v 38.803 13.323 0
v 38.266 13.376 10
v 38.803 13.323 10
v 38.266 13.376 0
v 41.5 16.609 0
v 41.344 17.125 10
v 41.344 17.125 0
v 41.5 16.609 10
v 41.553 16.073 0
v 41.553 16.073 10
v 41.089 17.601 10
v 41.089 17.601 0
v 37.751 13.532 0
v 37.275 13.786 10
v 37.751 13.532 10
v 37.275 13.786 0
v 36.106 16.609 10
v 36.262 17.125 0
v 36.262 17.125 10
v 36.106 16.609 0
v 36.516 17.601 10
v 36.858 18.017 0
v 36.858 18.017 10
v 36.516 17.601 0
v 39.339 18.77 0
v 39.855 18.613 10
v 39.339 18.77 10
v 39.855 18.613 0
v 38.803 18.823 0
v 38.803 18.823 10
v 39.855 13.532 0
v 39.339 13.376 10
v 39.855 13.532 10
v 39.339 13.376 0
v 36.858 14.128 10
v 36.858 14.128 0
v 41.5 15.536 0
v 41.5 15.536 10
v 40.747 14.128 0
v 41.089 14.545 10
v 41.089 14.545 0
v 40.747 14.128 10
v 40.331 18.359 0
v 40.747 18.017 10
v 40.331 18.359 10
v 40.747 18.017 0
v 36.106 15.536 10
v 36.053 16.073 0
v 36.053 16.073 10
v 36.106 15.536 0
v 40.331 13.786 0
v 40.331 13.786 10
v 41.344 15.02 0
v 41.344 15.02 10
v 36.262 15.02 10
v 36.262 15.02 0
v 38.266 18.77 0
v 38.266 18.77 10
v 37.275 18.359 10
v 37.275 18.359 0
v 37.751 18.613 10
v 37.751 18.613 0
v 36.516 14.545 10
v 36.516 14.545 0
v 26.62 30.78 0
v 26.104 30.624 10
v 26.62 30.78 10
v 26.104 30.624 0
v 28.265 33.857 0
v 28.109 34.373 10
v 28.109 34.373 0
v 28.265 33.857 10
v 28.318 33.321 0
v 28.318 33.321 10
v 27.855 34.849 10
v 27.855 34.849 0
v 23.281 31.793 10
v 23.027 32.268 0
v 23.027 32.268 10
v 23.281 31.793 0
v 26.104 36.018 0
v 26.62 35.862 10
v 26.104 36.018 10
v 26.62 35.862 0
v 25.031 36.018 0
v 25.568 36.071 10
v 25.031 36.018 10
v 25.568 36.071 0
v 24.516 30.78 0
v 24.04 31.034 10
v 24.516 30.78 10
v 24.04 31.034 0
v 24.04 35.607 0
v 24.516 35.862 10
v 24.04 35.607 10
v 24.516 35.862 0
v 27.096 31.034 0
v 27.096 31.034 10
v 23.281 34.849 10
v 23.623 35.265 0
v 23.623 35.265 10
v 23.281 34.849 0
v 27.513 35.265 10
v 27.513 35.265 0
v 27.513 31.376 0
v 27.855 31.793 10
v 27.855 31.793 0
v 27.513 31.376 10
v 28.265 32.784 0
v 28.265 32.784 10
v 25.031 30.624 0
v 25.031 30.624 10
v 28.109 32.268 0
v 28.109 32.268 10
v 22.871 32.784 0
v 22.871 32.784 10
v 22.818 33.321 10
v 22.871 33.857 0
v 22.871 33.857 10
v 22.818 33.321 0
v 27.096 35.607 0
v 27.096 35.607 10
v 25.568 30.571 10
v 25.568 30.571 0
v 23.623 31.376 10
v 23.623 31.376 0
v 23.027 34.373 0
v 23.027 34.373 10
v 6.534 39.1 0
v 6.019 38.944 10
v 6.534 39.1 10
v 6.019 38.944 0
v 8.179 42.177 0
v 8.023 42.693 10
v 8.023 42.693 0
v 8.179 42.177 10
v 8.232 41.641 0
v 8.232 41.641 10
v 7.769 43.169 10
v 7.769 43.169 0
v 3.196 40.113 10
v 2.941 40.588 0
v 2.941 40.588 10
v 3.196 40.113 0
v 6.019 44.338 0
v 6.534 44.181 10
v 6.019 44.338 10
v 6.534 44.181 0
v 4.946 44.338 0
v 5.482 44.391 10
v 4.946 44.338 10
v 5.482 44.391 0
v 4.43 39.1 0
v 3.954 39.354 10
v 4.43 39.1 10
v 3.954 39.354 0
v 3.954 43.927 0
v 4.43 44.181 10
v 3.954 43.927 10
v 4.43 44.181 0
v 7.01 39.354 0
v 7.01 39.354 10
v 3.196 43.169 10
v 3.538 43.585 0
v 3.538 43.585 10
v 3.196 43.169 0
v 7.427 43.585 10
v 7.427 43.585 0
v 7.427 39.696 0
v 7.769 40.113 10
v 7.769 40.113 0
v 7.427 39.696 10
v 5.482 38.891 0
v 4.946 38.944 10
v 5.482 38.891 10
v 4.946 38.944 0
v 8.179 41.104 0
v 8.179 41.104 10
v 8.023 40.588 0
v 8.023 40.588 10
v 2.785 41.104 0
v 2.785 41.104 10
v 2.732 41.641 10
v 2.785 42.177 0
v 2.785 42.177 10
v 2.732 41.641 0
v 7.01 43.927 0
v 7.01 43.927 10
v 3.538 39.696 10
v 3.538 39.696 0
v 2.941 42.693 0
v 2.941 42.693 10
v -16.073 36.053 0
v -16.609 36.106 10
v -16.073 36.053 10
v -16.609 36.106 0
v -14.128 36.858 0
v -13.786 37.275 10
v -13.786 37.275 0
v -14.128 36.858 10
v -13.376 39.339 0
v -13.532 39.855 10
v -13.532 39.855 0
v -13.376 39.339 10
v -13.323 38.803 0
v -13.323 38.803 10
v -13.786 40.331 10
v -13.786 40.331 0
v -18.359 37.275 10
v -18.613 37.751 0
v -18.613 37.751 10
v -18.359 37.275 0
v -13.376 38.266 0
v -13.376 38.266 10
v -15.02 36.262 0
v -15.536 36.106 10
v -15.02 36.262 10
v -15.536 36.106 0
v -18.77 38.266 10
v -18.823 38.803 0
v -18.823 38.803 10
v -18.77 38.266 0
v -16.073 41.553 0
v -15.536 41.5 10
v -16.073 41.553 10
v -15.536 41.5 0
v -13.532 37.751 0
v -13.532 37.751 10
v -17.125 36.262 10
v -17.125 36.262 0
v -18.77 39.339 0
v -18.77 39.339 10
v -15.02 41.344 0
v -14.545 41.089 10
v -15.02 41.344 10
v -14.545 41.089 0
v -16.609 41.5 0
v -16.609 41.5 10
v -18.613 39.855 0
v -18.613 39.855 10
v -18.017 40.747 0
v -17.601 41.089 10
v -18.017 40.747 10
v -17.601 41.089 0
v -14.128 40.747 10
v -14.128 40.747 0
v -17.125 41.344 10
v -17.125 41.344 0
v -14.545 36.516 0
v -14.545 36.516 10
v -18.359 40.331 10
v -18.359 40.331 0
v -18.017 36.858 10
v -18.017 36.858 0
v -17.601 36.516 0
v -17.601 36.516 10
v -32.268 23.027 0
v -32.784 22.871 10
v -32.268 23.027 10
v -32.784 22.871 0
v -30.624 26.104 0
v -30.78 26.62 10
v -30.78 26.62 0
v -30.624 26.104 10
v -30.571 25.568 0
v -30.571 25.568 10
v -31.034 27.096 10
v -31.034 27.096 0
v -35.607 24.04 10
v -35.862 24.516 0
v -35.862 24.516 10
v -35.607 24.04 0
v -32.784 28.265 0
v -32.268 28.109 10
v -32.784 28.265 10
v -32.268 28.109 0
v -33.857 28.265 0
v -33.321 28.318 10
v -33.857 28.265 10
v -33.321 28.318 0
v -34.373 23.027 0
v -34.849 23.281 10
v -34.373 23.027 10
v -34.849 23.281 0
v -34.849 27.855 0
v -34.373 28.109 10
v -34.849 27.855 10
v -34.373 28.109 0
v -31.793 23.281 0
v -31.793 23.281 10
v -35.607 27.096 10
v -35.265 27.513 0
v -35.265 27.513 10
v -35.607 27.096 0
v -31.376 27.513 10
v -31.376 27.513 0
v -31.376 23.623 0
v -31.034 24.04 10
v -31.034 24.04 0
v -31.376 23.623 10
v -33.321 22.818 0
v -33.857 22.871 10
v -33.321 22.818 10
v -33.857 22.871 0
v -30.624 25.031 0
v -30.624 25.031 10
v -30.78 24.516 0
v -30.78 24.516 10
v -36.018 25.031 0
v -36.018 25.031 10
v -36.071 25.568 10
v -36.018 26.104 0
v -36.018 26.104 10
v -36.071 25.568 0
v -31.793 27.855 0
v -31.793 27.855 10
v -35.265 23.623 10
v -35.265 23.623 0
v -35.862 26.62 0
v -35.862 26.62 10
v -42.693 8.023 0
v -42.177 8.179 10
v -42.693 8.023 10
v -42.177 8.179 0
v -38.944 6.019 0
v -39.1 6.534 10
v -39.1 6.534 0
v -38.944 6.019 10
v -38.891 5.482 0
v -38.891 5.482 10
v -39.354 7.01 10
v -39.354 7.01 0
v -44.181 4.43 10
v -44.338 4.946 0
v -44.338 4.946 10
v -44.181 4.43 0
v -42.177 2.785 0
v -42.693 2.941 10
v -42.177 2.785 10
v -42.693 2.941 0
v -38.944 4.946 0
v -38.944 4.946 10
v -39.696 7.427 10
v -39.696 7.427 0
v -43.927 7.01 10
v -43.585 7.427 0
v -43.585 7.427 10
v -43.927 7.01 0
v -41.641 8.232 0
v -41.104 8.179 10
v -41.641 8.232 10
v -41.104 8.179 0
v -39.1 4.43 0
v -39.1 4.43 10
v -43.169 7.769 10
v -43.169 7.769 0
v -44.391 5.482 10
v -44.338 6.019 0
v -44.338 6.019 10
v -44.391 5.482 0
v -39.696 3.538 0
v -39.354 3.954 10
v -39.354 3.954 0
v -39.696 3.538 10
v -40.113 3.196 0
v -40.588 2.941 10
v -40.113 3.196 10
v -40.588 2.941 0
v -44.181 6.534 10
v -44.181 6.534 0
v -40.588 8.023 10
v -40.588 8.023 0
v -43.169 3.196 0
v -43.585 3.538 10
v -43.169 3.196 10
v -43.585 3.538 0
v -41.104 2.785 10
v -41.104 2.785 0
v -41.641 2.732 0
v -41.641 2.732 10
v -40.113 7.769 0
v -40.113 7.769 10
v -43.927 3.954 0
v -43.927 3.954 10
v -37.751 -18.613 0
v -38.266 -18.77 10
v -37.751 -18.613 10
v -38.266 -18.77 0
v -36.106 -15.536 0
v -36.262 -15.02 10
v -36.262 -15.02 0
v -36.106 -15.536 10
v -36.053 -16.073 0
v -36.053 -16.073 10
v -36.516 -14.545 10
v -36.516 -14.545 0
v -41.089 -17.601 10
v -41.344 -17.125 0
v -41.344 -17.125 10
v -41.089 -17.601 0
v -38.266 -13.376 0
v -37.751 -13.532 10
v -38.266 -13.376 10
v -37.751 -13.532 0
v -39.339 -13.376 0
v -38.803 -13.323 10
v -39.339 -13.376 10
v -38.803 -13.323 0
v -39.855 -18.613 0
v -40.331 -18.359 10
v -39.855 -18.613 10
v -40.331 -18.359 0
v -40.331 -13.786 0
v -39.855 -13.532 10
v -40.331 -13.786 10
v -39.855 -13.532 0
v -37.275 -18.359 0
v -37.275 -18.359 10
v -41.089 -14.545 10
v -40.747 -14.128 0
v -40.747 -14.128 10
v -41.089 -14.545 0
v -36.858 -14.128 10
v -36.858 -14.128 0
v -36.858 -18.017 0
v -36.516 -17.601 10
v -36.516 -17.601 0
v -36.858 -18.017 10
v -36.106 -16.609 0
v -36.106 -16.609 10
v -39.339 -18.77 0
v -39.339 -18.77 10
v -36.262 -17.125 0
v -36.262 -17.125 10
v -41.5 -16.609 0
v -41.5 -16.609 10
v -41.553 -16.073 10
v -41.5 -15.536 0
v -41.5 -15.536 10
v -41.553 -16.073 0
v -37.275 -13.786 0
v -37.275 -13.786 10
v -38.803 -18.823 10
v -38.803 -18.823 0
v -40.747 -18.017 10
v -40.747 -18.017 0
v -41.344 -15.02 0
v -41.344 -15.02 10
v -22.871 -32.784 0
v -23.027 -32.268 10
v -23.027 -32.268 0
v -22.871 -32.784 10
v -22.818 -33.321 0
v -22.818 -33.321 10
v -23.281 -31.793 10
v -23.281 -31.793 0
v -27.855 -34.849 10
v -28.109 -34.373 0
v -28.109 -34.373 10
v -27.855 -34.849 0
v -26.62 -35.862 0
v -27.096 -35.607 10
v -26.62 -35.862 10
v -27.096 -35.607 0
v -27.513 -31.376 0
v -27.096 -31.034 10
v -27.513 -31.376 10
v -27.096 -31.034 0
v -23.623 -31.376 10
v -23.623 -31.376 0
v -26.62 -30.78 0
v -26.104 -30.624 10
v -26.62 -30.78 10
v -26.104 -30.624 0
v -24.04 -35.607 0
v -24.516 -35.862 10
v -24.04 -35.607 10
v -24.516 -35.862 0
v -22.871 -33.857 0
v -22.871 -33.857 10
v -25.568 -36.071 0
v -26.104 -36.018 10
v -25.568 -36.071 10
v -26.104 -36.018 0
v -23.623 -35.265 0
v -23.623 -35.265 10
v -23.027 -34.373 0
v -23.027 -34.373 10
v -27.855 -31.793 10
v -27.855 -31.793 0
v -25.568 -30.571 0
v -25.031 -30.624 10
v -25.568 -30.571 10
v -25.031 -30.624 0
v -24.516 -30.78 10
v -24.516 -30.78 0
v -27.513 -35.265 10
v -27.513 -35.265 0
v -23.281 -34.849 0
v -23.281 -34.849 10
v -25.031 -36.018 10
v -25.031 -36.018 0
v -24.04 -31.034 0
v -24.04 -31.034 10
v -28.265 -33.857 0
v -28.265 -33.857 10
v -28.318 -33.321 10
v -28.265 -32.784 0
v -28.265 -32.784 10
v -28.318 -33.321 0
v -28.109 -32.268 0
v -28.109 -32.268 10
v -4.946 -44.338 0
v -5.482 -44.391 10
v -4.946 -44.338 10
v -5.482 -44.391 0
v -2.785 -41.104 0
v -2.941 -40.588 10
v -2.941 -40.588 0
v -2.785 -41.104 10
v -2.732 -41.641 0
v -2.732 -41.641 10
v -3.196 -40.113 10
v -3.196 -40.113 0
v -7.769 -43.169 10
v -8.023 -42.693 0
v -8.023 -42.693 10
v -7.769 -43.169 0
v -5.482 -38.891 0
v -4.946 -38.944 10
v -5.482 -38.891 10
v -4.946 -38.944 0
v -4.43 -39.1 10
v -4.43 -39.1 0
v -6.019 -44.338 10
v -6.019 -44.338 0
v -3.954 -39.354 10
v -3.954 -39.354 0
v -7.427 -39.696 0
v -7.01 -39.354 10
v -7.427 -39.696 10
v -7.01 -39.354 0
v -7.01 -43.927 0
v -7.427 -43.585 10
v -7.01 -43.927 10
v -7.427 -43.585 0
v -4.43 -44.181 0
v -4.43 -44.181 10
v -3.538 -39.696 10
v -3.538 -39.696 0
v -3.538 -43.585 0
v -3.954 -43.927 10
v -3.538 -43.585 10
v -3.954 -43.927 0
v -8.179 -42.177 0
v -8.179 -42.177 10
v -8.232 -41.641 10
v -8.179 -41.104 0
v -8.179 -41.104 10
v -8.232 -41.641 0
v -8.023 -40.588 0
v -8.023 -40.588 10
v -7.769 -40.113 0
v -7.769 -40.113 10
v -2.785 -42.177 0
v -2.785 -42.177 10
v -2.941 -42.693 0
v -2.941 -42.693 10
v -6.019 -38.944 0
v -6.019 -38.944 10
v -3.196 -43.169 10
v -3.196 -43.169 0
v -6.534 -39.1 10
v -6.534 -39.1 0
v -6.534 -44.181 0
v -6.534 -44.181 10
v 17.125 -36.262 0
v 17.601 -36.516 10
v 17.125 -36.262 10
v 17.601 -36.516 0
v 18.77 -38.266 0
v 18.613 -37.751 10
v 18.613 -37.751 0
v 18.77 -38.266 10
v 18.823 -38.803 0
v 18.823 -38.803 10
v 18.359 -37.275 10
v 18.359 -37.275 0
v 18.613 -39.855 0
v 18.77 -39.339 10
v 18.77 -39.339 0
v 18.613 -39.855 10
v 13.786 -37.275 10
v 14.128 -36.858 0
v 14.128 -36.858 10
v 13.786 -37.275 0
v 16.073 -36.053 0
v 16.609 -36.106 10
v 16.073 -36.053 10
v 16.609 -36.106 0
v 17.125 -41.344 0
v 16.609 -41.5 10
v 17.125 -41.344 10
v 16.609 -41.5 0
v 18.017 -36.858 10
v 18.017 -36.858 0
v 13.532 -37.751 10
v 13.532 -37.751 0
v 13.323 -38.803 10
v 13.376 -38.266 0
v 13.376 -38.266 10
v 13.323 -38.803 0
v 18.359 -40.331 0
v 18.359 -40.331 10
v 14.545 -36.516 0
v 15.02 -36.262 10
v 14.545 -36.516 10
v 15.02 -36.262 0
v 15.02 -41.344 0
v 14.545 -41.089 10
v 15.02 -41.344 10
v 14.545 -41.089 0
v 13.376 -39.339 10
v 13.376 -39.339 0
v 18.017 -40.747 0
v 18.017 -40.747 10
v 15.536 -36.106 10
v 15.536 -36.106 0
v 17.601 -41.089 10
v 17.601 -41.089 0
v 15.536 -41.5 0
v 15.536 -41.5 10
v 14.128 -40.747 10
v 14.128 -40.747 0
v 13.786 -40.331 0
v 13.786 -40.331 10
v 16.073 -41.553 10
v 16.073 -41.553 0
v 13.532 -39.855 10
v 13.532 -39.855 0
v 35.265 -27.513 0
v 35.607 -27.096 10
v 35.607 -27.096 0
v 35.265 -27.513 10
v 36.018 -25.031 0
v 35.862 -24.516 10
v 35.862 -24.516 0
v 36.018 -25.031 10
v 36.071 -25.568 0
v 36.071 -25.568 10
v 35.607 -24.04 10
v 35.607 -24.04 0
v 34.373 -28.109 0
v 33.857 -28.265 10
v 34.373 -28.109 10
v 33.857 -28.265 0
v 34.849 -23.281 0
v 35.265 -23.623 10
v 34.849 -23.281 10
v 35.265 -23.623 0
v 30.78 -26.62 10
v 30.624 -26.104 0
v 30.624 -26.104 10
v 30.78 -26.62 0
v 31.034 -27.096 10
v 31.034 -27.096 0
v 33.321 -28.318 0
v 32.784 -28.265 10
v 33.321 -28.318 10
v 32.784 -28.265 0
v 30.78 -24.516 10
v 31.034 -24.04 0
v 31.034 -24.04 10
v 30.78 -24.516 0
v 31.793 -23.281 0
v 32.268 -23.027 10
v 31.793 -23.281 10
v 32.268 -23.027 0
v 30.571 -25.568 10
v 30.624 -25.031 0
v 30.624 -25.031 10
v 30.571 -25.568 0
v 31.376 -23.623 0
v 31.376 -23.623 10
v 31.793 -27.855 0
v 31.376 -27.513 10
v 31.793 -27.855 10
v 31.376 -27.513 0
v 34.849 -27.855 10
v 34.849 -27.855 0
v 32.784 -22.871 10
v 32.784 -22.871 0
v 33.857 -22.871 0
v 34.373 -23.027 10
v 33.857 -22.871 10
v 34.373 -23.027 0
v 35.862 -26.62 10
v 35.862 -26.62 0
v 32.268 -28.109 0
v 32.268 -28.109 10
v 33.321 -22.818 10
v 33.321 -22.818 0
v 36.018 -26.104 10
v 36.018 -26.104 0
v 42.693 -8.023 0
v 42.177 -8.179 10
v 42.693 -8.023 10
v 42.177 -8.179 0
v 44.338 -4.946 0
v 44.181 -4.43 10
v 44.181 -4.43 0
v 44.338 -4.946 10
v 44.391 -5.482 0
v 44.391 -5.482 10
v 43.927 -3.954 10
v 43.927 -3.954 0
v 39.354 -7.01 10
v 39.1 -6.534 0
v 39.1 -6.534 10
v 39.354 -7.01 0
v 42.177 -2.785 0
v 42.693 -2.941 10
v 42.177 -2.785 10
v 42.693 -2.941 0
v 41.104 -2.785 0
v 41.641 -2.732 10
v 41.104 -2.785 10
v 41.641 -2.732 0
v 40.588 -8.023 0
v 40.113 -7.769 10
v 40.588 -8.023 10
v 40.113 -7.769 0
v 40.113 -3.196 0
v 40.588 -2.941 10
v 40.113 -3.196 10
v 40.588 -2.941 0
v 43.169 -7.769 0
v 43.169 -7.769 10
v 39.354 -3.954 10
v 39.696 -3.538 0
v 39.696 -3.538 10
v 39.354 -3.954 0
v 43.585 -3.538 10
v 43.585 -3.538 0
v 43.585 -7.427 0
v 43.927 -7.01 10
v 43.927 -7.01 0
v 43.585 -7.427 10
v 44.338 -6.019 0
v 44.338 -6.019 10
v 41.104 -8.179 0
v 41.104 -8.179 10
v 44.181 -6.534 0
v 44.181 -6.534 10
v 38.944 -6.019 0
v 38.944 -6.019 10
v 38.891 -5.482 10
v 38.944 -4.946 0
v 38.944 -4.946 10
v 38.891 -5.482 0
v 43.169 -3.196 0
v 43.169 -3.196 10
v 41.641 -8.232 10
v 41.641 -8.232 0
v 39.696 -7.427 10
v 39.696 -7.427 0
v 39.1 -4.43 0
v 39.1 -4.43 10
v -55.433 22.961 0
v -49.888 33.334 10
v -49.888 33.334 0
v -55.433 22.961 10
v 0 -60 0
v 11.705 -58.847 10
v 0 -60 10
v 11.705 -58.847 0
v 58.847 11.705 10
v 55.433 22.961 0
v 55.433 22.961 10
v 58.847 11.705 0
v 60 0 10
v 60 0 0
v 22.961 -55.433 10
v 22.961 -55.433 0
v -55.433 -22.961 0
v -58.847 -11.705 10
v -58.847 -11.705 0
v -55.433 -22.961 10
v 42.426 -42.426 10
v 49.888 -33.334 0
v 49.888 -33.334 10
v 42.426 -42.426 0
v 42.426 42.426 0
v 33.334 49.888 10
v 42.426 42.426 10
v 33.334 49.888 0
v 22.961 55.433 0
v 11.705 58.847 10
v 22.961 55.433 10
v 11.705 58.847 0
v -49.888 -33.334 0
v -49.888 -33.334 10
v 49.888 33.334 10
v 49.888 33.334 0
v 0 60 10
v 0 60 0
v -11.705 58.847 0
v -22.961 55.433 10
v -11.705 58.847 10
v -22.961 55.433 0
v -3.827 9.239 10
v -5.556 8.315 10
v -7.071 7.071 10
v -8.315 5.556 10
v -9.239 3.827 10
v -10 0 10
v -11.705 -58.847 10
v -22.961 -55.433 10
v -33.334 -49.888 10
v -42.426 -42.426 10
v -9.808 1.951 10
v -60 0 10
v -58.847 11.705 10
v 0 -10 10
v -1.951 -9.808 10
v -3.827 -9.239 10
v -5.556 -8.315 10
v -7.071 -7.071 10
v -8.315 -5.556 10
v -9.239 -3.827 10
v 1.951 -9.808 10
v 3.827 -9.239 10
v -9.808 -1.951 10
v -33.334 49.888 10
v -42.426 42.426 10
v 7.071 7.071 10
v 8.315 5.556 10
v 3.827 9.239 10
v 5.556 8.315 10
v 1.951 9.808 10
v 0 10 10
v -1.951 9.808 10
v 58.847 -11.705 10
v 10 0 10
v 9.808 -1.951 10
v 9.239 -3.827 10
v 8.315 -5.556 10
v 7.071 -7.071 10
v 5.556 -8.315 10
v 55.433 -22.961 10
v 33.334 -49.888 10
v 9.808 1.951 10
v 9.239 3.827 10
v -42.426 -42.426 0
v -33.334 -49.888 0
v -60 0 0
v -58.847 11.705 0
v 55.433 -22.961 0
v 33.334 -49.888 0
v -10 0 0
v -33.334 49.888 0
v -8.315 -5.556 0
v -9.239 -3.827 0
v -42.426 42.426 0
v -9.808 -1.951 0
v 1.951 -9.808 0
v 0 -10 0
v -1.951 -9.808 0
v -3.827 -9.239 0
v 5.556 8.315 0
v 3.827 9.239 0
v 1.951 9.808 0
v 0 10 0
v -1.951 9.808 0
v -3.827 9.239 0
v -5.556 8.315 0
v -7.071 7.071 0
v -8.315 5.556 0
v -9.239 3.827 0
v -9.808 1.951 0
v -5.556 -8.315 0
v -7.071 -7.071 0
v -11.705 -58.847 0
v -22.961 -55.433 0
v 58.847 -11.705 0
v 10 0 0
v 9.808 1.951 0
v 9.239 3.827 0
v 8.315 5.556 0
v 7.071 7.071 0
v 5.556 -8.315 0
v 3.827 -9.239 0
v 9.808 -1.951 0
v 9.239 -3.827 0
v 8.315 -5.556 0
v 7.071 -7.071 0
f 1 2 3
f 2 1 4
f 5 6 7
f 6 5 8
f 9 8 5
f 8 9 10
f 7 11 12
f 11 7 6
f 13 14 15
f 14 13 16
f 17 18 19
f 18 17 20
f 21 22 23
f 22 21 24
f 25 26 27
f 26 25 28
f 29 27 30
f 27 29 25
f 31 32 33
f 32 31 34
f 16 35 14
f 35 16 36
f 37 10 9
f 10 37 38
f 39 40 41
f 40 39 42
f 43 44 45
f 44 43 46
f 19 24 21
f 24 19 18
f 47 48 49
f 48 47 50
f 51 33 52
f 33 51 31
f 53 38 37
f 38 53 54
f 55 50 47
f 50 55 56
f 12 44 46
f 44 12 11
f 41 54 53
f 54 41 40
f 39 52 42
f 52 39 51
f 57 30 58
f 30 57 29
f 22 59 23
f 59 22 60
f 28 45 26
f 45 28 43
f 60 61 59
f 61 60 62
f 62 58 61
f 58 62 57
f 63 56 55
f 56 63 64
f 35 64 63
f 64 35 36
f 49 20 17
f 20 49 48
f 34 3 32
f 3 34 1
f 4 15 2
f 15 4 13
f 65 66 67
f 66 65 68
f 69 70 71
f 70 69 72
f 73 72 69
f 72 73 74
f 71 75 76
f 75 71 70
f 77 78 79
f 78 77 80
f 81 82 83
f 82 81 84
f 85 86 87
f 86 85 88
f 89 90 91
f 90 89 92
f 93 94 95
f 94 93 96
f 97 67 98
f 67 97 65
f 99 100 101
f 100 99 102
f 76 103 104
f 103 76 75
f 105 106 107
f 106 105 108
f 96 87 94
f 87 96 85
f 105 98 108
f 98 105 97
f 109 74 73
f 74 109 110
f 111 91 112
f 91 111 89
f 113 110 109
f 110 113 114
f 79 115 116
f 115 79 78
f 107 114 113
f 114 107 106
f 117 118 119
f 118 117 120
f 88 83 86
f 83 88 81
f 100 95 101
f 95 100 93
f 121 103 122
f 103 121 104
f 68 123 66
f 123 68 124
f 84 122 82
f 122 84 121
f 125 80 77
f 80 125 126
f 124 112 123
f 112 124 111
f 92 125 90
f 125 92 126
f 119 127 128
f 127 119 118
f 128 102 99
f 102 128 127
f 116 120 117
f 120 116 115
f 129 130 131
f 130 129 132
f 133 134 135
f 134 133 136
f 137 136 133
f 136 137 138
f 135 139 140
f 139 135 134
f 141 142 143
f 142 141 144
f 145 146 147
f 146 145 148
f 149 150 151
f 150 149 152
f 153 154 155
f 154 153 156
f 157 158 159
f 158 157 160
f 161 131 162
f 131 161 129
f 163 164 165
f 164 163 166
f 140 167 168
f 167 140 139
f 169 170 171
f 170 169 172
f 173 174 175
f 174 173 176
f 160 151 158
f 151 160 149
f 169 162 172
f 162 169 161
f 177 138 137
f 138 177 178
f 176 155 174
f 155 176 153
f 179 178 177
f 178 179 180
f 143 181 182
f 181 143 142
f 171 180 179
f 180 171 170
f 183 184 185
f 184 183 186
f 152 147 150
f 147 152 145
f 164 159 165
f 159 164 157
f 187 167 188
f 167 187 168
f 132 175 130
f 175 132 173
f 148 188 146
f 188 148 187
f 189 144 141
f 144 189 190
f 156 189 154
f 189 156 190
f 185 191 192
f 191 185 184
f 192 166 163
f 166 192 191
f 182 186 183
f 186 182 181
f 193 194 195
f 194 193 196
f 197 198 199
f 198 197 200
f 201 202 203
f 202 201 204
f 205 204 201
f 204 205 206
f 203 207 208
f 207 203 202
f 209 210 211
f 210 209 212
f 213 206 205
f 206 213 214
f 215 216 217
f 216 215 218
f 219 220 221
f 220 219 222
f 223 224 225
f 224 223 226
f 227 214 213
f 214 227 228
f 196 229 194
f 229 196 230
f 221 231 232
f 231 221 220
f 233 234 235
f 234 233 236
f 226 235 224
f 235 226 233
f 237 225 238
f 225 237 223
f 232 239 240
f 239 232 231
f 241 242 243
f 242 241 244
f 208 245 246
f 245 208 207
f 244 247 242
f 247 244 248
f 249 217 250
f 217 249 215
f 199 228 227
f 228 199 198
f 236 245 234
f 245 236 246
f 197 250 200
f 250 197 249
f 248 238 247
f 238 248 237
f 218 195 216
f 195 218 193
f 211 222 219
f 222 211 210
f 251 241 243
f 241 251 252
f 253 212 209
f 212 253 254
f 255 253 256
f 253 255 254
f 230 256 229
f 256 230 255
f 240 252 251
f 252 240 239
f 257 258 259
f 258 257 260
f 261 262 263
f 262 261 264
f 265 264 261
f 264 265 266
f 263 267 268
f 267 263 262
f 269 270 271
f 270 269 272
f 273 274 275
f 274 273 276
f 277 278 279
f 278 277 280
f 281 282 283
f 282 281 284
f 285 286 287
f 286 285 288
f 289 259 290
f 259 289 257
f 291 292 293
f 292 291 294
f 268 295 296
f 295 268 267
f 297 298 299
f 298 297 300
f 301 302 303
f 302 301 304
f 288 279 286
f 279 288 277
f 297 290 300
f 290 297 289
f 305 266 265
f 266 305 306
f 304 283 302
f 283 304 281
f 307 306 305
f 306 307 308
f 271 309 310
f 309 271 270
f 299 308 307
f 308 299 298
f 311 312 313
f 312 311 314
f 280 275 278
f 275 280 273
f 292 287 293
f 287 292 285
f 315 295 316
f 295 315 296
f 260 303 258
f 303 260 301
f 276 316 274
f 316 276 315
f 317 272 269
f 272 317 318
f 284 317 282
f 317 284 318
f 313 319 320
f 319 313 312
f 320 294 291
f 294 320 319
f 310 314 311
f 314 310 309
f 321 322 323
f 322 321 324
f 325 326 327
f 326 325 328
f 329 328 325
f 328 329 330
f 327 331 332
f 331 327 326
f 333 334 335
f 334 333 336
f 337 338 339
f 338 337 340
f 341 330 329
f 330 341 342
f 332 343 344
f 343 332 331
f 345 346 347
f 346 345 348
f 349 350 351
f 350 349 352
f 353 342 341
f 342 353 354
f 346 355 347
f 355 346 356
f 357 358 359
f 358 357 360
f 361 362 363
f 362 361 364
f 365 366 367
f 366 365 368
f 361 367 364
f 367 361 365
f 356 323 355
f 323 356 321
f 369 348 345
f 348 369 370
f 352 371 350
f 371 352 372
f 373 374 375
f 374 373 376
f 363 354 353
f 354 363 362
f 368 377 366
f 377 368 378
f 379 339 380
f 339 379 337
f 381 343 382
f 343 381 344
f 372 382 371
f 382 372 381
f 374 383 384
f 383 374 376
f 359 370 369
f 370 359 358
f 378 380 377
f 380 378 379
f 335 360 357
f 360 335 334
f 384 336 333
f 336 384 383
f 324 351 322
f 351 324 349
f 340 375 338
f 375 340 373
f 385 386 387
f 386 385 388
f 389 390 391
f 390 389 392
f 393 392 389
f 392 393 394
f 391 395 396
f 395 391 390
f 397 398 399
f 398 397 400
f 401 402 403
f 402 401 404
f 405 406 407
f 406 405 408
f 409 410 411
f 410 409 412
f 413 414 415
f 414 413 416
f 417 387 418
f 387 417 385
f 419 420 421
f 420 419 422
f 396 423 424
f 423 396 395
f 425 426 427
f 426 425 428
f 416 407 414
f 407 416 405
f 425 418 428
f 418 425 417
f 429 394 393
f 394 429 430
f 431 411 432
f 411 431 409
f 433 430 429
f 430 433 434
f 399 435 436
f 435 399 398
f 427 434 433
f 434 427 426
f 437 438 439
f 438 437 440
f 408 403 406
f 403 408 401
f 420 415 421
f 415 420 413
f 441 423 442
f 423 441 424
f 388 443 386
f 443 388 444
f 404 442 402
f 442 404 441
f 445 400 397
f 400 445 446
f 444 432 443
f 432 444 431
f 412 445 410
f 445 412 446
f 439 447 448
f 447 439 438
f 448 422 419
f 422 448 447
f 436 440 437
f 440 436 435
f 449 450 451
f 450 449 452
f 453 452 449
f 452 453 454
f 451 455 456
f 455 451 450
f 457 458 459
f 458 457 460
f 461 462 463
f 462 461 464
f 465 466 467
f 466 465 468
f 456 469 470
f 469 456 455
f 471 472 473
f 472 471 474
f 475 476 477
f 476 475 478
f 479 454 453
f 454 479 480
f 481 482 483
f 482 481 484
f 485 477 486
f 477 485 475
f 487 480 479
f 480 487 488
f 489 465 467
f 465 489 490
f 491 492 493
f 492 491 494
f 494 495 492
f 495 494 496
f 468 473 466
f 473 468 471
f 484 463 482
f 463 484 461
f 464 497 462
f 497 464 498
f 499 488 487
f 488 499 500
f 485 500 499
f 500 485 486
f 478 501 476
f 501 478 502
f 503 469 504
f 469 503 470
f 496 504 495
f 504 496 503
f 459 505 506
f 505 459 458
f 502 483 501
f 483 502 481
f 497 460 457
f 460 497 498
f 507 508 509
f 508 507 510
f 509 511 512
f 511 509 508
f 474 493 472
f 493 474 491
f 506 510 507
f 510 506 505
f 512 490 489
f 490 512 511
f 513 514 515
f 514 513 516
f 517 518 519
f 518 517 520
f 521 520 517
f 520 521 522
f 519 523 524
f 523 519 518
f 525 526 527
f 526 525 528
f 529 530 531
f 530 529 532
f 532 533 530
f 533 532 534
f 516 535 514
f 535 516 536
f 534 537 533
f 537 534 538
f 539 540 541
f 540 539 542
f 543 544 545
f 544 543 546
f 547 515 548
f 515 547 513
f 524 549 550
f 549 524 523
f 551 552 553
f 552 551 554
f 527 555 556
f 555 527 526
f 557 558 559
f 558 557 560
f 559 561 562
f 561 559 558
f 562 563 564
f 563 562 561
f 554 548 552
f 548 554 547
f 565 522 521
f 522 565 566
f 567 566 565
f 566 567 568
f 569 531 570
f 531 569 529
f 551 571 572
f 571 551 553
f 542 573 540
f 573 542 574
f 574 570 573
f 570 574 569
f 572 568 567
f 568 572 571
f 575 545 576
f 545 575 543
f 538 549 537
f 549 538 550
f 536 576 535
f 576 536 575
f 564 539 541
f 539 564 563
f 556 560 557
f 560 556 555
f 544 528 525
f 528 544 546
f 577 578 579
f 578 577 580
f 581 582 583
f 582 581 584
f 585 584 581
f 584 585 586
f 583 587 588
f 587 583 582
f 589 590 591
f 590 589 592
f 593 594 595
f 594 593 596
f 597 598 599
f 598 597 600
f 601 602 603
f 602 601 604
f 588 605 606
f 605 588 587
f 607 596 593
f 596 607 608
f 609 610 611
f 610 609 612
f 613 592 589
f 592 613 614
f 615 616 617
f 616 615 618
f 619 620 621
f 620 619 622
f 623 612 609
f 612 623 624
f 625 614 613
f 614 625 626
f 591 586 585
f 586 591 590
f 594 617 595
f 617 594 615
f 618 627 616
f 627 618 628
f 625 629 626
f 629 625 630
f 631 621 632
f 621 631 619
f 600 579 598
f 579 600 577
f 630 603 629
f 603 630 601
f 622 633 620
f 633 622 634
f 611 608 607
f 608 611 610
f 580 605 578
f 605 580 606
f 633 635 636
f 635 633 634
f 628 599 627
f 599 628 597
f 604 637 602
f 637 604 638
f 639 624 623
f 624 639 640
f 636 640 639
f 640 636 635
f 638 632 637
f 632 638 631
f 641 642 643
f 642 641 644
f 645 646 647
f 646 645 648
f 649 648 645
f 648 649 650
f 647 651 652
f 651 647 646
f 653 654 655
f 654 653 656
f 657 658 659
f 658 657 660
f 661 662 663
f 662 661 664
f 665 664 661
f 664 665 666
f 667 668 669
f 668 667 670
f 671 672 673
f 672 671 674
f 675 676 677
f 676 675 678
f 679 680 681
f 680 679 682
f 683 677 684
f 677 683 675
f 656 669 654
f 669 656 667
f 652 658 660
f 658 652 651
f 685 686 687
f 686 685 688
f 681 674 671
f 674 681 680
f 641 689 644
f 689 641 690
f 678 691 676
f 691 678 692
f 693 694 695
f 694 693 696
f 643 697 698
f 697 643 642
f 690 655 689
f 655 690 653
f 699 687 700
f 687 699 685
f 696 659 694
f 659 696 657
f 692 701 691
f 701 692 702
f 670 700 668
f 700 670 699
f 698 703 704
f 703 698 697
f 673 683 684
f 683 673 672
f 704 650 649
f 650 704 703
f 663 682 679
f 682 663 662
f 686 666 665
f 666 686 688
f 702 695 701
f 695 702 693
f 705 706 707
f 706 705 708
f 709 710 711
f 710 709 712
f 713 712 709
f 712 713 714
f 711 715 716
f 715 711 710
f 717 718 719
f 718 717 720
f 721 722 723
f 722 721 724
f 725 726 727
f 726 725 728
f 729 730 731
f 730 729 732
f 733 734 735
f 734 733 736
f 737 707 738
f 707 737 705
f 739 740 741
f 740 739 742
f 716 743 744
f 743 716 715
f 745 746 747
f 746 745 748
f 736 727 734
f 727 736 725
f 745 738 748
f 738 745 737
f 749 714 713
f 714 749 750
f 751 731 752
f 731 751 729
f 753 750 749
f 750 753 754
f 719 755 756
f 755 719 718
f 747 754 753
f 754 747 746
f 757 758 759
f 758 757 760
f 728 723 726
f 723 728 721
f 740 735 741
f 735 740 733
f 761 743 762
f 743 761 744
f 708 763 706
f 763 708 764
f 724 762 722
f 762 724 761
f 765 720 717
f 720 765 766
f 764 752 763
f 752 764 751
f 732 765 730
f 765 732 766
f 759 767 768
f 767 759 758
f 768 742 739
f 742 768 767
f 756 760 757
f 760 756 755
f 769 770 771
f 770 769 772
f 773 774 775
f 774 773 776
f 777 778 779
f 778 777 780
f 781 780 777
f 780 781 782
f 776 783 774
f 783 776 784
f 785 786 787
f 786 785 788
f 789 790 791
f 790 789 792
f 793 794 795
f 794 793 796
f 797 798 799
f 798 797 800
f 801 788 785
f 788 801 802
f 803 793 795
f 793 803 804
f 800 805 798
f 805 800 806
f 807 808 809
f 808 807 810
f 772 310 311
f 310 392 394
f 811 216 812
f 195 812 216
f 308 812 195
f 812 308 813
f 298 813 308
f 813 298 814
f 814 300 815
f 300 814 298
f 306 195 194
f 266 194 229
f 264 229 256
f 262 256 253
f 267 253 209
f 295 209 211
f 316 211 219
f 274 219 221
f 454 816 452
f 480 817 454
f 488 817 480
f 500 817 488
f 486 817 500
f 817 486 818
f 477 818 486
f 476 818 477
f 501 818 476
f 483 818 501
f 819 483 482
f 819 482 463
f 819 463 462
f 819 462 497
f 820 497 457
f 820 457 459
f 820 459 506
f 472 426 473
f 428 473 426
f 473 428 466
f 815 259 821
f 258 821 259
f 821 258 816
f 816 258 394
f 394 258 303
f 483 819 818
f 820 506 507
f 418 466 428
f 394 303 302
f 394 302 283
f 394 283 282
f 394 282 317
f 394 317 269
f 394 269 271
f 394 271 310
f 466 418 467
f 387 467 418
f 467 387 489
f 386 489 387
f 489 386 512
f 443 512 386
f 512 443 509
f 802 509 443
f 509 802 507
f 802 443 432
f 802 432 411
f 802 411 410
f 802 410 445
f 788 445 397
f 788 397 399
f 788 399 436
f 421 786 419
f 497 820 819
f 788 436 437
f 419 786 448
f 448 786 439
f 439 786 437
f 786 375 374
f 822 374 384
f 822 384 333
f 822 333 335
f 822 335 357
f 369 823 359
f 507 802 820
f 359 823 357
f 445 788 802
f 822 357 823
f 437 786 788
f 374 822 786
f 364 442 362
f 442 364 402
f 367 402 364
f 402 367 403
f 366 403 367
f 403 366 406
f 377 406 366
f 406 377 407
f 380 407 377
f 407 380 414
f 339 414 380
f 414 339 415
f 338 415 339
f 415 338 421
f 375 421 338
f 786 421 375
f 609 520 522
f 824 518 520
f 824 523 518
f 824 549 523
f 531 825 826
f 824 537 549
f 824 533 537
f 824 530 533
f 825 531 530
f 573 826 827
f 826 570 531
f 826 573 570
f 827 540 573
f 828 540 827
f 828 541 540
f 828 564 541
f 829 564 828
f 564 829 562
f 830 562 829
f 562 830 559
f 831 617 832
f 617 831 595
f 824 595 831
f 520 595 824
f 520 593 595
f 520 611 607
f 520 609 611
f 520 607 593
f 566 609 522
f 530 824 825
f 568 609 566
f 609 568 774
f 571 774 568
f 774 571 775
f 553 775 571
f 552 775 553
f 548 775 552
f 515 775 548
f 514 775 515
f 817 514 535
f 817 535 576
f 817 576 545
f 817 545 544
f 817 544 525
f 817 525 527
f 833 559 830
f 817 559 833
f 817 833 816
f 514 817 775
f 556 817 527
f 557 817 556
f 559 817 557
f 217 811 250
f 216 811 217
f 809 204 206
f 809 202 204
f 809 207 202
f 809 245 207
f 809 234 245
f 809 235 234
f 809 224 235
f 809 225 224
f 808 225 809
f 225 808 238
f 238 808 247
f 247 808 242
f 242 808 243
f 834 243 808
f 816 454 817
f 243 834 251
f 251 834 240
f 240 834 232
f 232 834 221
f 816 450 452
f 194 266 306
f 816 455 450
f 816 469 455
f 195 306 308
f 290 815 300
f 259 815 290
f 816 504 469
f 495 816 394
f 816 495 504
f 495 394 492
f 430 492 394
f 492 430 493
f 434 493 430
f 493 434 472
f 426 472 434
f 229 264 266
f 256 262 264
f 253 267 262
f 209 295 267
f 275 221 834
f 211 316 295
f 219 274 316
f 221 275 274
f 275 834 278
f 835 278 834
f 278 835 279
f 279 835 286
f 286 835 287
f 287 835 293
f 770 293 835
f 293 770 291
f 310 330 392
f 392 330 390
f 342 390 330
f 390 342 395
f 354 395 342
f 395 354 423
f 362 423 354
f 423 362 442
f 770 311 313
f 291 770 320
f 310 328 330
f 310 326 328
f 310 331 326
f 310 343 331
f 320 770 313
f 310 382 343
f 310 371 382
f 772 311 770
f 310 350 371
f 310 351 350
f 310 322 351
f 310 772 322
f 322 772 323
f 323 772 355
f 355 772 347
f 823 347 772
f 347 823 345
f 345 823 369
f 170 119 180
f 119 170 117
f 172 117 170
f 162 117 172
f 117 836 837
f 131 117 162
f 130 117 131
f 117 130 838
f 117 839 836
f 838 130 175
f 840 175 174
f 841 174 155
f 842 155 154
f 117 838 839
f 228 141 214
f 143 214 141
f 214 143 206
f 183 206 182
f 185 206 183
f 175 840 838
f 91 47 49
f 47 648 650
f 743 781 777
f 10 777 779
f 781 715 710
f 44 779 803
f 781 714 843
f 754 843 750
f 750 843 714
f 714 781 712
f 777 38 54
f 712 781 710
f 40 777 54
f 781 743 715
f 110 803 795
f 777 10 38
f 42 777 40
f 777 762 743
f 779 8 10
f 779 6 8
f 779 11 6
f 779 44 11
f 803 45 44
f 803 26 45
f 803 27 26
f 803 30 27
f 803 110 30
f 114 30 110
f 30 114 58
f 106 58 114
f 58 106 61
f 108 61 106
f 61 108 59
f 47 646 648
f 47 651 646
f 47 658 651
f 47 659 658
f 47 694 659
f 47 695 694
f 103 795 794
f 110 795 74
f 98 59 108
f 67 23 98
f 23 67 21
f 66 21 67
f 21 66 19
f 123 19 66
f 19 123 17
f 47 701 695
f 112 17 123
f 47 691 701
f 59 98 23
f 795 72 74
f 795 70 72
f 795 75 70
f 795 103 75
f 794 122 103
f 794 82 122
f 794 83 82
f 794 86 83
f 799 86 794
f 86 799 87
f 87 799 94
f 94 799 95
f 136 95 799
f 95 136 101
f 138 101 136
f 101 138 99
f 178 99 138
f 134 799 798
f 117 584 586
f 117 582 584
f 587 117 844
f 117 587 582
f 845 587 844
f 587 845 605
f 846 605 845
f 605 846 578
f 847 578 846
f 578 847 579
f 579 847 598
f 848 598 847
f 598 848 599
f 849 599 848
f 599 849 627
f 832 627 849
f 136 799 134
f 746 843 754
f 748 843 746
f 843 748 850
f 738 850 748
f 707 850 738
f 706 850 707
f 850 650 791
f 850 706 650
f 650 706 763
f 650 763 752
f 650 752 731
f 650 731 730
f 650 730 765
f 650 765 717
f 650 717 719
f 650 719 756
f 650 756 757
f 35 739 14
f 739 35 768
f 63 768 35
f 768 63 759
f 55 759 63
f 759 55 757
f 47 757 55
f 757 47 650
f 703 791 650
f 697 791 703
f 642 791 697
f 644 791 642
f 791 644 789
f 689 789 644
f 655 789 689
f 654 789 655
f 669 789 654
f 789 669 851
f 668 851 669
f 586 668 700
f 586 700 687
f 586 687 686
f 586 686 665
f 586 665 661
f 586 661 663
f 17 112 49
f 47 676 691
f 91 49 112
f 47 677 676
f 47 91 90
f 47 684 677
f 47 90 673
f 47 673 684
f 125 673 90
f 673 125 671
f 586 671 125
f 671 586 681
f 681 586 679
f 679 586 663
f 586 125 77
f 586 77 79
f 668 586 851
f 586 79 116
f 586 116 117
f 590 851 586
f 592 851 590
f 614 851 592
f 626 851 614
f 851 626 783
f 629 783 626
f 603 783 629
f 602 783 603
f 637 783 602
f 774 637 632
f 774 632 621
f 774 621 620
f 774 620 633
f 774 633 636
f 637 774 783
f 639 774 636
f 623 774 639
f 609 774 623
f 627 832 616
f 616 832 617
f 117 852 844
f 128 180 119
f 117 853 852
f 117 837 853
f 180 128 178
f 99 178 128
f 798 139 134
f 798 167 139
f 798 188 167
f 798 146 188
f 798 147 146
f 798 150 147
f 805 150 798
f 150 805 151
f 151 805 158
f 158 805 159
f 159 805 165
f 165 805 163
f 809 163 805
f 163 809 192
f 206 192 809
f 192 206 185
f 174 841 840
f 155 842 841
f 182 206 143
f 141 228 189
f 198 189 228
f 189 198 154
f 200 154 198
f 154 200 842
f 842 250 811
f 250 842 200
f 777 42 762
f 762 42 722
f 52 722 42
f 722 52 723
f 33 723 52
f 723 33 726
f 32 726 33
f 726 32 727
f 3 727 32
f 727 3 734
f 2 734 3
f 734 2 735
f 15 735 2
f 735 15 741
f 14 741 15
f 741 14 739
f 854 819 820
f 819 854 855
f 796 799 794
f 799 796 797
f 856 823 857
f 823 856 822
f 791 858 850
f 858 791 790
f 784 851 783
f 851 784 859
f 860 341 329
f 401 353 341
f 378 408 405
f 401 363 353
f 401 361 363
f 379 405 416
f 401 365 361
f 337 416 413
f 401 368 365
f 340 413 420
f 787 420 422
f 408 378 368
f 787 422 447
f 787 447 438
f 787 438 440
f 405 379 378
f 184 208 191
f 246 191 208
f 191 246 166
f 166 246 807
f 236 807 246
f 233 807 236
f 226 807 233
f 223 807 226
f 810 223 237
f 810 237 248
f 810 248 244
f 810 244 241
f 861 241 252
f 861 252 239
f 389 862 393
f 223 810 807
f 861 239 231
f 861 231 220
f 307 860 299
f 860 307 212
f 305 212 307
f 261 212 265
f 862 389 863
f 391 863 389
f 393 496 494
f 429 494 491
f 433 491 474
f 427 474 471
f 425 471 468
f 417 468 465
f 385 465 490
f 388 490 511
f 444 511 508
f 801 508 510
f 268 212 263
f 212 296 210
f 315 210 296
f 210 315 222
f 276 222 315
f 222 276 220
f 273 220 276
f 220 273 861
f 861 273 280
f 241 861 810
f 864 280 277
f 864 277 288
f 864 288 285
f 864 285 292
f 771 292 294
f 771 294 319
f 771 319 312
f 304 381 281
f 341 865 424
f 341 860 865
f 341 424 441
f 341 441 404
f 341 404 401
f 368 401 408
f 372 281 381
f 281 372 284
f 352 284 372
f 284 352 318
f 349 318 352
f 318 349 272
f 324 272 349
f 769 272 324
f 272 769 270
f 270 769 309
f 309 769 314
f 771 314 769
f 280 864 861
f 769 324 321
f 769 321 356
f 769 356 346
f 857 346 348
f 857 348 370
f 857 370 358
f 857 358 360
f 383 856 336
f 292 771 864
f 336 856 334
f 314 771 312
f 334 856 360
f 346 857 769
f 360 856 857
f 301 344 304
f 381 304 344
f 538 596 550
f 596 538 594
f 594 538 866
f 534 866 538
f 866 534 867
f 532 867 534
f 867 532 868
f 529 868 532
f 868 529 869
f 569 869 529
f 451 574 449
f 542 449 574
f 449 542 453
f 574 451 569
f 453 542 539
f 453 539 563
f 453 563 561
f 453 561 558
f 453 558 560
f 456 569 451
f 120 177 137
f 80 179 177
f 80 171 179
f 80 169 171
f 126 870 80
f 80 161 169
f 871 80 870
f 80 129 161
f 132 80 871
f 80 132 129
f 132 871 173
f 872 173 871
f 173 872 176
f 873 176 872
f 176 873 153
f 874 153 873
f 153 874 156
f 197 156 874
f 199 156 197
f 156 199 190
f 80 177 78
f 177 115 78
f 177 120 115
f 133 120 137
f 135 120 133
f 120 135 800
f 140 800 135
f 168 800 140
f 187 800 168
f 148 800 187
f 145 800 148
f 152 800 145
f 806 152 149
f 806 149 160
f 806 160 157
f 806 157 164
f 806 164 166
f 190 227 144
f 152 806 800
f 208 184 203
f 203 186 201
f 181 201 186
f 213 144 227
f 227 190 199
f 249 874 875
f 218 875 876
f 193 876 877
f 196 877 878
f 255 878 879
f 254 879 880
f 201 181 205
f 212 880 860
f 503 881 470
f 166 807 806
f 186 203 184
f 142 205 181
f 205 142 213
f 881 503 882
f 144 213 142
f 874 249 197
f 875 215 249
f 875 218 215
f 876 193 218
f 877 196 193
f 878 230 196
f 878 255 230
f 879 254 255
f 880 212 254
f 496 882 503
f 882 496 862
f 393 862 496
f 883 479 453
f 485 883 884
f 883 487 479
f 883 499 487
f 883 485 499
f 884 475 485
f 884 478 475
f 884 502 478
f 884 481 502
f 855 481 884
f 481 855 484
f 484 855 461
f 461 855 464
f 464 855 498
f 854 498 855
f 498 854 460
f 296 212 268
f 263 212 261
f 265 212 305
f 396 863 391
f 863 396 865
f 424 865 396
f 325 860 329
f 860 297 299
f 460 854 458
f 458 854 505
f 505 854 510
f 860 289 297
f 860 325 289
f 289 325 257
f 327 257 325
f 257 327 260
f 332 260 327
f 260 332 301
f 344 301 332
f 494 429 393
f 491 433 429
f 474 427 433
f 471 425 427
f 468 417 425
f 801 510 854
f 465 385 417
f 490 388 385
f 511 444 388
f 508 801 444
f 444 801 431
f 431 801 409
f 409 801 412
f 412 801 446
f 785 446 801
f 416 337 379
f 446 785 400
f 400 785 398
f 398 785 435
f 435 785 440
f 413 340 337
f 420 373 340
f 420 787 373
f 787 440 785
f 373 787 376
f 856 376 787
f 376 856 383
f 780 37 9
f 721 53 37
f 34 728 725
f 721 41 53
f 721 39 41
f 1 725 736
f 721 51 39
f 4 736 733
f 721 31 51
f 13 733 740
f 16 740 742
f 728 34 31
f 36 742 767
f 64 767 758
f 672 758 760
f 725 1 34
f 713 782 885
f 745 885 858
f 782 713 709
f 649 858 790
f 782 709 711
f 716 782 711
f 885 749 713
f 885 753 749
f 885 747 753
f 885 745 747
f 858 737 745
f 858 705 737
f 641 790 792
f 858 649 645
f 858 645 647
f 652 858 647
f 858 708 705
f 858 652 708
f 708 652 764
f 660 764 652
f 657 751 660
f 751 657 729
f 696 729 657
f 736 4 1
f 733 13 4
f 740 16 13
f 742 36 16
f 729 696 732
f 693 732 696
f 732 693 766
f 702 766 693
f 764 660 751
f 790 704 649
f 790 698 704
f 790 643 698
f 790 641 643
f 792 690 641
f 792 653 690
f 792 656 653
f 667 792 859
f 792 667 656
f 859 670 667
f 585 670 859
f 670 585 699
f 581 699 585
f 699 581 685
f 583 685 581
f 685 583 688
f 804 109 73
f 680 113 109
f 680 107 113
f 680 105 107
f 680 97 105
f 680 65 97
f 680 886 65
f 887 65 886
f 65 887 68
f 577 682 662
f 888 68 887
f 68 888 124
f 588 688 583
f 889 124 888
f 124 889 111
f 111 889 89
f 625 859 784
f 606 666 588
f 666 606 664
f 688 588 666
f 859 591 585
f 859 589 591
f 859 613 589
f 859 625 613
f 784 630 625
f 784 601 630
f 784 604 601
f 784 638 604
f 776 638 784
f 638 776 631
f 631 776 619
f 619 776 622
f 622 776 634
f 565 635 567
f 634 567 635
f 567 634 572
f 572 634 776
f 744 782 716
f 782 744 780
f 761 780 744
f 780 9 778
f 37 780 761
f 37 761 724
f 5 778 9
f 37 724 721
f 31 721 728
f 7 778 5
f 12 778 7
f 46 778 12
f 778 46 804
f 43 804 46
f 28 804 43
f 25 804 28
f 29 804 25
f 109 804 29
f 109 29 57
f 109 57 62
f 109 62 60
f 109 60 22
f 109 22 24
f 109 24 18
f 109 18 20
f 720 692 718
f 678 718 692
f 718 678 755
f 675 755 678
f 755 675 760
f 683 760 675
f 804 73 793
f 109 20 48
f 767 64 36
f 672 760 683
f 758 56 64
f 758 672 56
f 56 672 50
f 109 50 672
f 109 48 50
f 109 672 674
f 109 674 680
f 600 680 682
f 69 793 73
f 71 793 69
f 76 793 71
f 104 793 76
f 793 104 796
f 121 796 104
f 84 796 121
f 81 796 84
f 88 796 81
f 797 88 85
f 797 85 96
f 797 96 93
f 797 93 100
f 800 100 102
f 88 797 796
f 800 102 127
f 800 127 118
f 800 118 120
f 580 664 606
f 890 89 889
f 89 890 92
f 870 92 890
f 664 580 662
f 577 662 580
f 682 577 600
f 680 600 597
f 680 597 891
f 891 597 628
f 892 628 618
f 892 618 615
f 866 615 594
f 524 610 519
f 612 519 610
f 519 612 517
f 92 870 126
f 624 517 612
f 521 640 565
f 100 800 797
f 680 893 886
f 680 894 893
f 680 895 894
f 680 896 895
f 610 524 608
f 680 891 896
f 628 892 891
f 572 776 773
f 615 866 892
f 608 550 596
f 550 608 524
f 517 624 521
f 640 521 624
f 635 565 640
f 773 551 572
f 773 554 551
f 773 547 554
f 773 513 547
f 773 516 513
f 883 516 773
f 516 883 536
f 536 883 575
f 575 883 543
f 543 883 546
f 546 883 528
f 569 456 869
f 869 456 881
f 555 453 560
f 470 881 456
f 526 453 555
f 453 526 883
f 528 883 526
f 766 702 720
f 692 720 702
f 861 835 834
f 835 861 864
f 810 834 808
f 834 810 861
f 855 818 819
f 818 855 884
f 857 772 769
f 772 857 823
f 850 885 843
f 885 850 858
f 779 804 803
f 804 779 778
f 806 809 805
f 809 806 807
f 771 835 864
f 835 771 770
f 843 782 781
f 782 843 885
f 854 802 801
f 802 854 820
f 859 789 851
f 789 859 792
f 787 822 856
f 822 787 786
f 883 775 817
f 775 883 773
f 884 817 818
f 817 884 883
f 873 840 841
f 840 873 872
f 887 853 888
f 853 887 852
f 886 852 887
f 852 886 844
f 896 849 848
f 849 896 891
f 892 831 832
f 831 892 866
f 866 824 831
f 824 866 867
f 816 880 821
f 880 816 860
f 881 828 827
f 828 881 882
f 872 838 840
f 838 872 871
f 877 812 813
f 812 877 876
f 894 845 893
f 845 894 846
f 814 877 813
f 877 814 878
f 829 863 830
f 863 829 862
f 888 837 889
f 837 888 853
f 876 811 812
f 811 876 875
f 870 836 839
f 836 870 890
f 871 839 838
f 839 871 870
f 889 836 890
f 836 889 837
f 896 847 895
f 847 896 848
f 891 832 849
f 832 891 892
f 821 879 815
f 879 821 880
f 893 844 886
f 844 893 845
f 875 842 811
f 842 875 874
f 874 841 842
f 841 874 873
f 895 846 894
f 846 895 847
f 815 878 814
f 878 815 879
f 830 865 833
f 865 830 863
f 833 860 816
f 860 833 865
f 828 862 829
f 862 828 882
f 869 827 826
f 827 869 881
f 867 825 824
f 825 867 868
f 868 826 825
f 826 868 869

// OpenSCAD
$fn = 32;

// ----------------------------------------------------------------------
// Flange Ø120 x 10
// 12 holes on a Ø84 bolt circle, bolted joints
// ----------------------------------------------------------------------

// --- parameters (mm) ---
flange_d = 120;    // outside diameter of the flange
thickness = 10;    // flange thickness
holes = 12;        // number of bolt holes
pcd = 84;          // bolt circle diameter
start_deg = 22.5;  // angle of the first hole, from +X
hole_d = 5.5;      // bolt hole diameter
bore_d = 20;       // central through bore
hub_d = 30;        // hub outside diameter
hub_h = 0;         // hub height above the flange face (0 = no hub)

// --- derived feature positions (mm) ---
height = thickness + hub_h;  // = 10   overall height of the part
pcd_r = pcd / 2;             // = 42   bolt circle radius
hole_step = 360 / holes;     // = 30   angular pitch
feature_centers = [
  [pcd_r * cos(start_deg + 0 * hole_step), pcd_r * sin(start_deg + 0 * hole_step)],
  [pcd_r * cos(start_deg + 1 * hole_step), pcd_r * sin(start_deg + 1 * hole_step)],
  [pcd_r * cos(start_deg + 2 * hole_step), pcd_r * sin(start_deg + 2 * hole_step)],
  [pcd_r * cos(start_deg + 3 * hole_step), pcd_r * sin(start_deg + 3 * hole_step)],
  [pcd_r * cos(start_deg + 4 * hole_step), pcd_r * sin(start_deg + 4 * hole_step)],
  [pcd_r * cos(start_deg + 5 * hole_step), pcd_r * sin(start_deg + 5 * hole_step)],
  [pcd_r * cos(start_deg + 6 * hole_step), pcd_r * sin(start_deg + 6 * hole_step)],
  [pcd_r * cos(start_deg + 7 * hole_step), pcd_r * sin(start_deg + 7 * hole_step)],
  [pcd_r * cos(start_deg + 8 * hole_step), pcd_r * sin(start_deg + 8 * hole_step)],
  [pcd_r * cos(start_deg + 9 * hole_step), pcd_r * sin(start_deg + 9 * hole_step)],
  [pcd_r * cos(start_deg + 10 * hole_step), pcd_r * sin(start_deg + 10 * hole_step)],
  [pcd_r * cos(start_deg + 11 * hole_step), pcd_r * sin(start_deg + 11 * hole_step)]
];   // bolt hole centres on the pitch circle

// flange disc, every hole and the bore cut straight through
difference() {
  union() {
    cylinder(d = flange_d, h = thickness);
  }
  translate([0, 0, -1]) cylinder(d = bore_d, h = height + 2);  // bore, through
  for (centre = feature_centers)
    translate([centre[0], centre[1], -1]) cylinder(d = hole_d, h = thickness + 2);
}
